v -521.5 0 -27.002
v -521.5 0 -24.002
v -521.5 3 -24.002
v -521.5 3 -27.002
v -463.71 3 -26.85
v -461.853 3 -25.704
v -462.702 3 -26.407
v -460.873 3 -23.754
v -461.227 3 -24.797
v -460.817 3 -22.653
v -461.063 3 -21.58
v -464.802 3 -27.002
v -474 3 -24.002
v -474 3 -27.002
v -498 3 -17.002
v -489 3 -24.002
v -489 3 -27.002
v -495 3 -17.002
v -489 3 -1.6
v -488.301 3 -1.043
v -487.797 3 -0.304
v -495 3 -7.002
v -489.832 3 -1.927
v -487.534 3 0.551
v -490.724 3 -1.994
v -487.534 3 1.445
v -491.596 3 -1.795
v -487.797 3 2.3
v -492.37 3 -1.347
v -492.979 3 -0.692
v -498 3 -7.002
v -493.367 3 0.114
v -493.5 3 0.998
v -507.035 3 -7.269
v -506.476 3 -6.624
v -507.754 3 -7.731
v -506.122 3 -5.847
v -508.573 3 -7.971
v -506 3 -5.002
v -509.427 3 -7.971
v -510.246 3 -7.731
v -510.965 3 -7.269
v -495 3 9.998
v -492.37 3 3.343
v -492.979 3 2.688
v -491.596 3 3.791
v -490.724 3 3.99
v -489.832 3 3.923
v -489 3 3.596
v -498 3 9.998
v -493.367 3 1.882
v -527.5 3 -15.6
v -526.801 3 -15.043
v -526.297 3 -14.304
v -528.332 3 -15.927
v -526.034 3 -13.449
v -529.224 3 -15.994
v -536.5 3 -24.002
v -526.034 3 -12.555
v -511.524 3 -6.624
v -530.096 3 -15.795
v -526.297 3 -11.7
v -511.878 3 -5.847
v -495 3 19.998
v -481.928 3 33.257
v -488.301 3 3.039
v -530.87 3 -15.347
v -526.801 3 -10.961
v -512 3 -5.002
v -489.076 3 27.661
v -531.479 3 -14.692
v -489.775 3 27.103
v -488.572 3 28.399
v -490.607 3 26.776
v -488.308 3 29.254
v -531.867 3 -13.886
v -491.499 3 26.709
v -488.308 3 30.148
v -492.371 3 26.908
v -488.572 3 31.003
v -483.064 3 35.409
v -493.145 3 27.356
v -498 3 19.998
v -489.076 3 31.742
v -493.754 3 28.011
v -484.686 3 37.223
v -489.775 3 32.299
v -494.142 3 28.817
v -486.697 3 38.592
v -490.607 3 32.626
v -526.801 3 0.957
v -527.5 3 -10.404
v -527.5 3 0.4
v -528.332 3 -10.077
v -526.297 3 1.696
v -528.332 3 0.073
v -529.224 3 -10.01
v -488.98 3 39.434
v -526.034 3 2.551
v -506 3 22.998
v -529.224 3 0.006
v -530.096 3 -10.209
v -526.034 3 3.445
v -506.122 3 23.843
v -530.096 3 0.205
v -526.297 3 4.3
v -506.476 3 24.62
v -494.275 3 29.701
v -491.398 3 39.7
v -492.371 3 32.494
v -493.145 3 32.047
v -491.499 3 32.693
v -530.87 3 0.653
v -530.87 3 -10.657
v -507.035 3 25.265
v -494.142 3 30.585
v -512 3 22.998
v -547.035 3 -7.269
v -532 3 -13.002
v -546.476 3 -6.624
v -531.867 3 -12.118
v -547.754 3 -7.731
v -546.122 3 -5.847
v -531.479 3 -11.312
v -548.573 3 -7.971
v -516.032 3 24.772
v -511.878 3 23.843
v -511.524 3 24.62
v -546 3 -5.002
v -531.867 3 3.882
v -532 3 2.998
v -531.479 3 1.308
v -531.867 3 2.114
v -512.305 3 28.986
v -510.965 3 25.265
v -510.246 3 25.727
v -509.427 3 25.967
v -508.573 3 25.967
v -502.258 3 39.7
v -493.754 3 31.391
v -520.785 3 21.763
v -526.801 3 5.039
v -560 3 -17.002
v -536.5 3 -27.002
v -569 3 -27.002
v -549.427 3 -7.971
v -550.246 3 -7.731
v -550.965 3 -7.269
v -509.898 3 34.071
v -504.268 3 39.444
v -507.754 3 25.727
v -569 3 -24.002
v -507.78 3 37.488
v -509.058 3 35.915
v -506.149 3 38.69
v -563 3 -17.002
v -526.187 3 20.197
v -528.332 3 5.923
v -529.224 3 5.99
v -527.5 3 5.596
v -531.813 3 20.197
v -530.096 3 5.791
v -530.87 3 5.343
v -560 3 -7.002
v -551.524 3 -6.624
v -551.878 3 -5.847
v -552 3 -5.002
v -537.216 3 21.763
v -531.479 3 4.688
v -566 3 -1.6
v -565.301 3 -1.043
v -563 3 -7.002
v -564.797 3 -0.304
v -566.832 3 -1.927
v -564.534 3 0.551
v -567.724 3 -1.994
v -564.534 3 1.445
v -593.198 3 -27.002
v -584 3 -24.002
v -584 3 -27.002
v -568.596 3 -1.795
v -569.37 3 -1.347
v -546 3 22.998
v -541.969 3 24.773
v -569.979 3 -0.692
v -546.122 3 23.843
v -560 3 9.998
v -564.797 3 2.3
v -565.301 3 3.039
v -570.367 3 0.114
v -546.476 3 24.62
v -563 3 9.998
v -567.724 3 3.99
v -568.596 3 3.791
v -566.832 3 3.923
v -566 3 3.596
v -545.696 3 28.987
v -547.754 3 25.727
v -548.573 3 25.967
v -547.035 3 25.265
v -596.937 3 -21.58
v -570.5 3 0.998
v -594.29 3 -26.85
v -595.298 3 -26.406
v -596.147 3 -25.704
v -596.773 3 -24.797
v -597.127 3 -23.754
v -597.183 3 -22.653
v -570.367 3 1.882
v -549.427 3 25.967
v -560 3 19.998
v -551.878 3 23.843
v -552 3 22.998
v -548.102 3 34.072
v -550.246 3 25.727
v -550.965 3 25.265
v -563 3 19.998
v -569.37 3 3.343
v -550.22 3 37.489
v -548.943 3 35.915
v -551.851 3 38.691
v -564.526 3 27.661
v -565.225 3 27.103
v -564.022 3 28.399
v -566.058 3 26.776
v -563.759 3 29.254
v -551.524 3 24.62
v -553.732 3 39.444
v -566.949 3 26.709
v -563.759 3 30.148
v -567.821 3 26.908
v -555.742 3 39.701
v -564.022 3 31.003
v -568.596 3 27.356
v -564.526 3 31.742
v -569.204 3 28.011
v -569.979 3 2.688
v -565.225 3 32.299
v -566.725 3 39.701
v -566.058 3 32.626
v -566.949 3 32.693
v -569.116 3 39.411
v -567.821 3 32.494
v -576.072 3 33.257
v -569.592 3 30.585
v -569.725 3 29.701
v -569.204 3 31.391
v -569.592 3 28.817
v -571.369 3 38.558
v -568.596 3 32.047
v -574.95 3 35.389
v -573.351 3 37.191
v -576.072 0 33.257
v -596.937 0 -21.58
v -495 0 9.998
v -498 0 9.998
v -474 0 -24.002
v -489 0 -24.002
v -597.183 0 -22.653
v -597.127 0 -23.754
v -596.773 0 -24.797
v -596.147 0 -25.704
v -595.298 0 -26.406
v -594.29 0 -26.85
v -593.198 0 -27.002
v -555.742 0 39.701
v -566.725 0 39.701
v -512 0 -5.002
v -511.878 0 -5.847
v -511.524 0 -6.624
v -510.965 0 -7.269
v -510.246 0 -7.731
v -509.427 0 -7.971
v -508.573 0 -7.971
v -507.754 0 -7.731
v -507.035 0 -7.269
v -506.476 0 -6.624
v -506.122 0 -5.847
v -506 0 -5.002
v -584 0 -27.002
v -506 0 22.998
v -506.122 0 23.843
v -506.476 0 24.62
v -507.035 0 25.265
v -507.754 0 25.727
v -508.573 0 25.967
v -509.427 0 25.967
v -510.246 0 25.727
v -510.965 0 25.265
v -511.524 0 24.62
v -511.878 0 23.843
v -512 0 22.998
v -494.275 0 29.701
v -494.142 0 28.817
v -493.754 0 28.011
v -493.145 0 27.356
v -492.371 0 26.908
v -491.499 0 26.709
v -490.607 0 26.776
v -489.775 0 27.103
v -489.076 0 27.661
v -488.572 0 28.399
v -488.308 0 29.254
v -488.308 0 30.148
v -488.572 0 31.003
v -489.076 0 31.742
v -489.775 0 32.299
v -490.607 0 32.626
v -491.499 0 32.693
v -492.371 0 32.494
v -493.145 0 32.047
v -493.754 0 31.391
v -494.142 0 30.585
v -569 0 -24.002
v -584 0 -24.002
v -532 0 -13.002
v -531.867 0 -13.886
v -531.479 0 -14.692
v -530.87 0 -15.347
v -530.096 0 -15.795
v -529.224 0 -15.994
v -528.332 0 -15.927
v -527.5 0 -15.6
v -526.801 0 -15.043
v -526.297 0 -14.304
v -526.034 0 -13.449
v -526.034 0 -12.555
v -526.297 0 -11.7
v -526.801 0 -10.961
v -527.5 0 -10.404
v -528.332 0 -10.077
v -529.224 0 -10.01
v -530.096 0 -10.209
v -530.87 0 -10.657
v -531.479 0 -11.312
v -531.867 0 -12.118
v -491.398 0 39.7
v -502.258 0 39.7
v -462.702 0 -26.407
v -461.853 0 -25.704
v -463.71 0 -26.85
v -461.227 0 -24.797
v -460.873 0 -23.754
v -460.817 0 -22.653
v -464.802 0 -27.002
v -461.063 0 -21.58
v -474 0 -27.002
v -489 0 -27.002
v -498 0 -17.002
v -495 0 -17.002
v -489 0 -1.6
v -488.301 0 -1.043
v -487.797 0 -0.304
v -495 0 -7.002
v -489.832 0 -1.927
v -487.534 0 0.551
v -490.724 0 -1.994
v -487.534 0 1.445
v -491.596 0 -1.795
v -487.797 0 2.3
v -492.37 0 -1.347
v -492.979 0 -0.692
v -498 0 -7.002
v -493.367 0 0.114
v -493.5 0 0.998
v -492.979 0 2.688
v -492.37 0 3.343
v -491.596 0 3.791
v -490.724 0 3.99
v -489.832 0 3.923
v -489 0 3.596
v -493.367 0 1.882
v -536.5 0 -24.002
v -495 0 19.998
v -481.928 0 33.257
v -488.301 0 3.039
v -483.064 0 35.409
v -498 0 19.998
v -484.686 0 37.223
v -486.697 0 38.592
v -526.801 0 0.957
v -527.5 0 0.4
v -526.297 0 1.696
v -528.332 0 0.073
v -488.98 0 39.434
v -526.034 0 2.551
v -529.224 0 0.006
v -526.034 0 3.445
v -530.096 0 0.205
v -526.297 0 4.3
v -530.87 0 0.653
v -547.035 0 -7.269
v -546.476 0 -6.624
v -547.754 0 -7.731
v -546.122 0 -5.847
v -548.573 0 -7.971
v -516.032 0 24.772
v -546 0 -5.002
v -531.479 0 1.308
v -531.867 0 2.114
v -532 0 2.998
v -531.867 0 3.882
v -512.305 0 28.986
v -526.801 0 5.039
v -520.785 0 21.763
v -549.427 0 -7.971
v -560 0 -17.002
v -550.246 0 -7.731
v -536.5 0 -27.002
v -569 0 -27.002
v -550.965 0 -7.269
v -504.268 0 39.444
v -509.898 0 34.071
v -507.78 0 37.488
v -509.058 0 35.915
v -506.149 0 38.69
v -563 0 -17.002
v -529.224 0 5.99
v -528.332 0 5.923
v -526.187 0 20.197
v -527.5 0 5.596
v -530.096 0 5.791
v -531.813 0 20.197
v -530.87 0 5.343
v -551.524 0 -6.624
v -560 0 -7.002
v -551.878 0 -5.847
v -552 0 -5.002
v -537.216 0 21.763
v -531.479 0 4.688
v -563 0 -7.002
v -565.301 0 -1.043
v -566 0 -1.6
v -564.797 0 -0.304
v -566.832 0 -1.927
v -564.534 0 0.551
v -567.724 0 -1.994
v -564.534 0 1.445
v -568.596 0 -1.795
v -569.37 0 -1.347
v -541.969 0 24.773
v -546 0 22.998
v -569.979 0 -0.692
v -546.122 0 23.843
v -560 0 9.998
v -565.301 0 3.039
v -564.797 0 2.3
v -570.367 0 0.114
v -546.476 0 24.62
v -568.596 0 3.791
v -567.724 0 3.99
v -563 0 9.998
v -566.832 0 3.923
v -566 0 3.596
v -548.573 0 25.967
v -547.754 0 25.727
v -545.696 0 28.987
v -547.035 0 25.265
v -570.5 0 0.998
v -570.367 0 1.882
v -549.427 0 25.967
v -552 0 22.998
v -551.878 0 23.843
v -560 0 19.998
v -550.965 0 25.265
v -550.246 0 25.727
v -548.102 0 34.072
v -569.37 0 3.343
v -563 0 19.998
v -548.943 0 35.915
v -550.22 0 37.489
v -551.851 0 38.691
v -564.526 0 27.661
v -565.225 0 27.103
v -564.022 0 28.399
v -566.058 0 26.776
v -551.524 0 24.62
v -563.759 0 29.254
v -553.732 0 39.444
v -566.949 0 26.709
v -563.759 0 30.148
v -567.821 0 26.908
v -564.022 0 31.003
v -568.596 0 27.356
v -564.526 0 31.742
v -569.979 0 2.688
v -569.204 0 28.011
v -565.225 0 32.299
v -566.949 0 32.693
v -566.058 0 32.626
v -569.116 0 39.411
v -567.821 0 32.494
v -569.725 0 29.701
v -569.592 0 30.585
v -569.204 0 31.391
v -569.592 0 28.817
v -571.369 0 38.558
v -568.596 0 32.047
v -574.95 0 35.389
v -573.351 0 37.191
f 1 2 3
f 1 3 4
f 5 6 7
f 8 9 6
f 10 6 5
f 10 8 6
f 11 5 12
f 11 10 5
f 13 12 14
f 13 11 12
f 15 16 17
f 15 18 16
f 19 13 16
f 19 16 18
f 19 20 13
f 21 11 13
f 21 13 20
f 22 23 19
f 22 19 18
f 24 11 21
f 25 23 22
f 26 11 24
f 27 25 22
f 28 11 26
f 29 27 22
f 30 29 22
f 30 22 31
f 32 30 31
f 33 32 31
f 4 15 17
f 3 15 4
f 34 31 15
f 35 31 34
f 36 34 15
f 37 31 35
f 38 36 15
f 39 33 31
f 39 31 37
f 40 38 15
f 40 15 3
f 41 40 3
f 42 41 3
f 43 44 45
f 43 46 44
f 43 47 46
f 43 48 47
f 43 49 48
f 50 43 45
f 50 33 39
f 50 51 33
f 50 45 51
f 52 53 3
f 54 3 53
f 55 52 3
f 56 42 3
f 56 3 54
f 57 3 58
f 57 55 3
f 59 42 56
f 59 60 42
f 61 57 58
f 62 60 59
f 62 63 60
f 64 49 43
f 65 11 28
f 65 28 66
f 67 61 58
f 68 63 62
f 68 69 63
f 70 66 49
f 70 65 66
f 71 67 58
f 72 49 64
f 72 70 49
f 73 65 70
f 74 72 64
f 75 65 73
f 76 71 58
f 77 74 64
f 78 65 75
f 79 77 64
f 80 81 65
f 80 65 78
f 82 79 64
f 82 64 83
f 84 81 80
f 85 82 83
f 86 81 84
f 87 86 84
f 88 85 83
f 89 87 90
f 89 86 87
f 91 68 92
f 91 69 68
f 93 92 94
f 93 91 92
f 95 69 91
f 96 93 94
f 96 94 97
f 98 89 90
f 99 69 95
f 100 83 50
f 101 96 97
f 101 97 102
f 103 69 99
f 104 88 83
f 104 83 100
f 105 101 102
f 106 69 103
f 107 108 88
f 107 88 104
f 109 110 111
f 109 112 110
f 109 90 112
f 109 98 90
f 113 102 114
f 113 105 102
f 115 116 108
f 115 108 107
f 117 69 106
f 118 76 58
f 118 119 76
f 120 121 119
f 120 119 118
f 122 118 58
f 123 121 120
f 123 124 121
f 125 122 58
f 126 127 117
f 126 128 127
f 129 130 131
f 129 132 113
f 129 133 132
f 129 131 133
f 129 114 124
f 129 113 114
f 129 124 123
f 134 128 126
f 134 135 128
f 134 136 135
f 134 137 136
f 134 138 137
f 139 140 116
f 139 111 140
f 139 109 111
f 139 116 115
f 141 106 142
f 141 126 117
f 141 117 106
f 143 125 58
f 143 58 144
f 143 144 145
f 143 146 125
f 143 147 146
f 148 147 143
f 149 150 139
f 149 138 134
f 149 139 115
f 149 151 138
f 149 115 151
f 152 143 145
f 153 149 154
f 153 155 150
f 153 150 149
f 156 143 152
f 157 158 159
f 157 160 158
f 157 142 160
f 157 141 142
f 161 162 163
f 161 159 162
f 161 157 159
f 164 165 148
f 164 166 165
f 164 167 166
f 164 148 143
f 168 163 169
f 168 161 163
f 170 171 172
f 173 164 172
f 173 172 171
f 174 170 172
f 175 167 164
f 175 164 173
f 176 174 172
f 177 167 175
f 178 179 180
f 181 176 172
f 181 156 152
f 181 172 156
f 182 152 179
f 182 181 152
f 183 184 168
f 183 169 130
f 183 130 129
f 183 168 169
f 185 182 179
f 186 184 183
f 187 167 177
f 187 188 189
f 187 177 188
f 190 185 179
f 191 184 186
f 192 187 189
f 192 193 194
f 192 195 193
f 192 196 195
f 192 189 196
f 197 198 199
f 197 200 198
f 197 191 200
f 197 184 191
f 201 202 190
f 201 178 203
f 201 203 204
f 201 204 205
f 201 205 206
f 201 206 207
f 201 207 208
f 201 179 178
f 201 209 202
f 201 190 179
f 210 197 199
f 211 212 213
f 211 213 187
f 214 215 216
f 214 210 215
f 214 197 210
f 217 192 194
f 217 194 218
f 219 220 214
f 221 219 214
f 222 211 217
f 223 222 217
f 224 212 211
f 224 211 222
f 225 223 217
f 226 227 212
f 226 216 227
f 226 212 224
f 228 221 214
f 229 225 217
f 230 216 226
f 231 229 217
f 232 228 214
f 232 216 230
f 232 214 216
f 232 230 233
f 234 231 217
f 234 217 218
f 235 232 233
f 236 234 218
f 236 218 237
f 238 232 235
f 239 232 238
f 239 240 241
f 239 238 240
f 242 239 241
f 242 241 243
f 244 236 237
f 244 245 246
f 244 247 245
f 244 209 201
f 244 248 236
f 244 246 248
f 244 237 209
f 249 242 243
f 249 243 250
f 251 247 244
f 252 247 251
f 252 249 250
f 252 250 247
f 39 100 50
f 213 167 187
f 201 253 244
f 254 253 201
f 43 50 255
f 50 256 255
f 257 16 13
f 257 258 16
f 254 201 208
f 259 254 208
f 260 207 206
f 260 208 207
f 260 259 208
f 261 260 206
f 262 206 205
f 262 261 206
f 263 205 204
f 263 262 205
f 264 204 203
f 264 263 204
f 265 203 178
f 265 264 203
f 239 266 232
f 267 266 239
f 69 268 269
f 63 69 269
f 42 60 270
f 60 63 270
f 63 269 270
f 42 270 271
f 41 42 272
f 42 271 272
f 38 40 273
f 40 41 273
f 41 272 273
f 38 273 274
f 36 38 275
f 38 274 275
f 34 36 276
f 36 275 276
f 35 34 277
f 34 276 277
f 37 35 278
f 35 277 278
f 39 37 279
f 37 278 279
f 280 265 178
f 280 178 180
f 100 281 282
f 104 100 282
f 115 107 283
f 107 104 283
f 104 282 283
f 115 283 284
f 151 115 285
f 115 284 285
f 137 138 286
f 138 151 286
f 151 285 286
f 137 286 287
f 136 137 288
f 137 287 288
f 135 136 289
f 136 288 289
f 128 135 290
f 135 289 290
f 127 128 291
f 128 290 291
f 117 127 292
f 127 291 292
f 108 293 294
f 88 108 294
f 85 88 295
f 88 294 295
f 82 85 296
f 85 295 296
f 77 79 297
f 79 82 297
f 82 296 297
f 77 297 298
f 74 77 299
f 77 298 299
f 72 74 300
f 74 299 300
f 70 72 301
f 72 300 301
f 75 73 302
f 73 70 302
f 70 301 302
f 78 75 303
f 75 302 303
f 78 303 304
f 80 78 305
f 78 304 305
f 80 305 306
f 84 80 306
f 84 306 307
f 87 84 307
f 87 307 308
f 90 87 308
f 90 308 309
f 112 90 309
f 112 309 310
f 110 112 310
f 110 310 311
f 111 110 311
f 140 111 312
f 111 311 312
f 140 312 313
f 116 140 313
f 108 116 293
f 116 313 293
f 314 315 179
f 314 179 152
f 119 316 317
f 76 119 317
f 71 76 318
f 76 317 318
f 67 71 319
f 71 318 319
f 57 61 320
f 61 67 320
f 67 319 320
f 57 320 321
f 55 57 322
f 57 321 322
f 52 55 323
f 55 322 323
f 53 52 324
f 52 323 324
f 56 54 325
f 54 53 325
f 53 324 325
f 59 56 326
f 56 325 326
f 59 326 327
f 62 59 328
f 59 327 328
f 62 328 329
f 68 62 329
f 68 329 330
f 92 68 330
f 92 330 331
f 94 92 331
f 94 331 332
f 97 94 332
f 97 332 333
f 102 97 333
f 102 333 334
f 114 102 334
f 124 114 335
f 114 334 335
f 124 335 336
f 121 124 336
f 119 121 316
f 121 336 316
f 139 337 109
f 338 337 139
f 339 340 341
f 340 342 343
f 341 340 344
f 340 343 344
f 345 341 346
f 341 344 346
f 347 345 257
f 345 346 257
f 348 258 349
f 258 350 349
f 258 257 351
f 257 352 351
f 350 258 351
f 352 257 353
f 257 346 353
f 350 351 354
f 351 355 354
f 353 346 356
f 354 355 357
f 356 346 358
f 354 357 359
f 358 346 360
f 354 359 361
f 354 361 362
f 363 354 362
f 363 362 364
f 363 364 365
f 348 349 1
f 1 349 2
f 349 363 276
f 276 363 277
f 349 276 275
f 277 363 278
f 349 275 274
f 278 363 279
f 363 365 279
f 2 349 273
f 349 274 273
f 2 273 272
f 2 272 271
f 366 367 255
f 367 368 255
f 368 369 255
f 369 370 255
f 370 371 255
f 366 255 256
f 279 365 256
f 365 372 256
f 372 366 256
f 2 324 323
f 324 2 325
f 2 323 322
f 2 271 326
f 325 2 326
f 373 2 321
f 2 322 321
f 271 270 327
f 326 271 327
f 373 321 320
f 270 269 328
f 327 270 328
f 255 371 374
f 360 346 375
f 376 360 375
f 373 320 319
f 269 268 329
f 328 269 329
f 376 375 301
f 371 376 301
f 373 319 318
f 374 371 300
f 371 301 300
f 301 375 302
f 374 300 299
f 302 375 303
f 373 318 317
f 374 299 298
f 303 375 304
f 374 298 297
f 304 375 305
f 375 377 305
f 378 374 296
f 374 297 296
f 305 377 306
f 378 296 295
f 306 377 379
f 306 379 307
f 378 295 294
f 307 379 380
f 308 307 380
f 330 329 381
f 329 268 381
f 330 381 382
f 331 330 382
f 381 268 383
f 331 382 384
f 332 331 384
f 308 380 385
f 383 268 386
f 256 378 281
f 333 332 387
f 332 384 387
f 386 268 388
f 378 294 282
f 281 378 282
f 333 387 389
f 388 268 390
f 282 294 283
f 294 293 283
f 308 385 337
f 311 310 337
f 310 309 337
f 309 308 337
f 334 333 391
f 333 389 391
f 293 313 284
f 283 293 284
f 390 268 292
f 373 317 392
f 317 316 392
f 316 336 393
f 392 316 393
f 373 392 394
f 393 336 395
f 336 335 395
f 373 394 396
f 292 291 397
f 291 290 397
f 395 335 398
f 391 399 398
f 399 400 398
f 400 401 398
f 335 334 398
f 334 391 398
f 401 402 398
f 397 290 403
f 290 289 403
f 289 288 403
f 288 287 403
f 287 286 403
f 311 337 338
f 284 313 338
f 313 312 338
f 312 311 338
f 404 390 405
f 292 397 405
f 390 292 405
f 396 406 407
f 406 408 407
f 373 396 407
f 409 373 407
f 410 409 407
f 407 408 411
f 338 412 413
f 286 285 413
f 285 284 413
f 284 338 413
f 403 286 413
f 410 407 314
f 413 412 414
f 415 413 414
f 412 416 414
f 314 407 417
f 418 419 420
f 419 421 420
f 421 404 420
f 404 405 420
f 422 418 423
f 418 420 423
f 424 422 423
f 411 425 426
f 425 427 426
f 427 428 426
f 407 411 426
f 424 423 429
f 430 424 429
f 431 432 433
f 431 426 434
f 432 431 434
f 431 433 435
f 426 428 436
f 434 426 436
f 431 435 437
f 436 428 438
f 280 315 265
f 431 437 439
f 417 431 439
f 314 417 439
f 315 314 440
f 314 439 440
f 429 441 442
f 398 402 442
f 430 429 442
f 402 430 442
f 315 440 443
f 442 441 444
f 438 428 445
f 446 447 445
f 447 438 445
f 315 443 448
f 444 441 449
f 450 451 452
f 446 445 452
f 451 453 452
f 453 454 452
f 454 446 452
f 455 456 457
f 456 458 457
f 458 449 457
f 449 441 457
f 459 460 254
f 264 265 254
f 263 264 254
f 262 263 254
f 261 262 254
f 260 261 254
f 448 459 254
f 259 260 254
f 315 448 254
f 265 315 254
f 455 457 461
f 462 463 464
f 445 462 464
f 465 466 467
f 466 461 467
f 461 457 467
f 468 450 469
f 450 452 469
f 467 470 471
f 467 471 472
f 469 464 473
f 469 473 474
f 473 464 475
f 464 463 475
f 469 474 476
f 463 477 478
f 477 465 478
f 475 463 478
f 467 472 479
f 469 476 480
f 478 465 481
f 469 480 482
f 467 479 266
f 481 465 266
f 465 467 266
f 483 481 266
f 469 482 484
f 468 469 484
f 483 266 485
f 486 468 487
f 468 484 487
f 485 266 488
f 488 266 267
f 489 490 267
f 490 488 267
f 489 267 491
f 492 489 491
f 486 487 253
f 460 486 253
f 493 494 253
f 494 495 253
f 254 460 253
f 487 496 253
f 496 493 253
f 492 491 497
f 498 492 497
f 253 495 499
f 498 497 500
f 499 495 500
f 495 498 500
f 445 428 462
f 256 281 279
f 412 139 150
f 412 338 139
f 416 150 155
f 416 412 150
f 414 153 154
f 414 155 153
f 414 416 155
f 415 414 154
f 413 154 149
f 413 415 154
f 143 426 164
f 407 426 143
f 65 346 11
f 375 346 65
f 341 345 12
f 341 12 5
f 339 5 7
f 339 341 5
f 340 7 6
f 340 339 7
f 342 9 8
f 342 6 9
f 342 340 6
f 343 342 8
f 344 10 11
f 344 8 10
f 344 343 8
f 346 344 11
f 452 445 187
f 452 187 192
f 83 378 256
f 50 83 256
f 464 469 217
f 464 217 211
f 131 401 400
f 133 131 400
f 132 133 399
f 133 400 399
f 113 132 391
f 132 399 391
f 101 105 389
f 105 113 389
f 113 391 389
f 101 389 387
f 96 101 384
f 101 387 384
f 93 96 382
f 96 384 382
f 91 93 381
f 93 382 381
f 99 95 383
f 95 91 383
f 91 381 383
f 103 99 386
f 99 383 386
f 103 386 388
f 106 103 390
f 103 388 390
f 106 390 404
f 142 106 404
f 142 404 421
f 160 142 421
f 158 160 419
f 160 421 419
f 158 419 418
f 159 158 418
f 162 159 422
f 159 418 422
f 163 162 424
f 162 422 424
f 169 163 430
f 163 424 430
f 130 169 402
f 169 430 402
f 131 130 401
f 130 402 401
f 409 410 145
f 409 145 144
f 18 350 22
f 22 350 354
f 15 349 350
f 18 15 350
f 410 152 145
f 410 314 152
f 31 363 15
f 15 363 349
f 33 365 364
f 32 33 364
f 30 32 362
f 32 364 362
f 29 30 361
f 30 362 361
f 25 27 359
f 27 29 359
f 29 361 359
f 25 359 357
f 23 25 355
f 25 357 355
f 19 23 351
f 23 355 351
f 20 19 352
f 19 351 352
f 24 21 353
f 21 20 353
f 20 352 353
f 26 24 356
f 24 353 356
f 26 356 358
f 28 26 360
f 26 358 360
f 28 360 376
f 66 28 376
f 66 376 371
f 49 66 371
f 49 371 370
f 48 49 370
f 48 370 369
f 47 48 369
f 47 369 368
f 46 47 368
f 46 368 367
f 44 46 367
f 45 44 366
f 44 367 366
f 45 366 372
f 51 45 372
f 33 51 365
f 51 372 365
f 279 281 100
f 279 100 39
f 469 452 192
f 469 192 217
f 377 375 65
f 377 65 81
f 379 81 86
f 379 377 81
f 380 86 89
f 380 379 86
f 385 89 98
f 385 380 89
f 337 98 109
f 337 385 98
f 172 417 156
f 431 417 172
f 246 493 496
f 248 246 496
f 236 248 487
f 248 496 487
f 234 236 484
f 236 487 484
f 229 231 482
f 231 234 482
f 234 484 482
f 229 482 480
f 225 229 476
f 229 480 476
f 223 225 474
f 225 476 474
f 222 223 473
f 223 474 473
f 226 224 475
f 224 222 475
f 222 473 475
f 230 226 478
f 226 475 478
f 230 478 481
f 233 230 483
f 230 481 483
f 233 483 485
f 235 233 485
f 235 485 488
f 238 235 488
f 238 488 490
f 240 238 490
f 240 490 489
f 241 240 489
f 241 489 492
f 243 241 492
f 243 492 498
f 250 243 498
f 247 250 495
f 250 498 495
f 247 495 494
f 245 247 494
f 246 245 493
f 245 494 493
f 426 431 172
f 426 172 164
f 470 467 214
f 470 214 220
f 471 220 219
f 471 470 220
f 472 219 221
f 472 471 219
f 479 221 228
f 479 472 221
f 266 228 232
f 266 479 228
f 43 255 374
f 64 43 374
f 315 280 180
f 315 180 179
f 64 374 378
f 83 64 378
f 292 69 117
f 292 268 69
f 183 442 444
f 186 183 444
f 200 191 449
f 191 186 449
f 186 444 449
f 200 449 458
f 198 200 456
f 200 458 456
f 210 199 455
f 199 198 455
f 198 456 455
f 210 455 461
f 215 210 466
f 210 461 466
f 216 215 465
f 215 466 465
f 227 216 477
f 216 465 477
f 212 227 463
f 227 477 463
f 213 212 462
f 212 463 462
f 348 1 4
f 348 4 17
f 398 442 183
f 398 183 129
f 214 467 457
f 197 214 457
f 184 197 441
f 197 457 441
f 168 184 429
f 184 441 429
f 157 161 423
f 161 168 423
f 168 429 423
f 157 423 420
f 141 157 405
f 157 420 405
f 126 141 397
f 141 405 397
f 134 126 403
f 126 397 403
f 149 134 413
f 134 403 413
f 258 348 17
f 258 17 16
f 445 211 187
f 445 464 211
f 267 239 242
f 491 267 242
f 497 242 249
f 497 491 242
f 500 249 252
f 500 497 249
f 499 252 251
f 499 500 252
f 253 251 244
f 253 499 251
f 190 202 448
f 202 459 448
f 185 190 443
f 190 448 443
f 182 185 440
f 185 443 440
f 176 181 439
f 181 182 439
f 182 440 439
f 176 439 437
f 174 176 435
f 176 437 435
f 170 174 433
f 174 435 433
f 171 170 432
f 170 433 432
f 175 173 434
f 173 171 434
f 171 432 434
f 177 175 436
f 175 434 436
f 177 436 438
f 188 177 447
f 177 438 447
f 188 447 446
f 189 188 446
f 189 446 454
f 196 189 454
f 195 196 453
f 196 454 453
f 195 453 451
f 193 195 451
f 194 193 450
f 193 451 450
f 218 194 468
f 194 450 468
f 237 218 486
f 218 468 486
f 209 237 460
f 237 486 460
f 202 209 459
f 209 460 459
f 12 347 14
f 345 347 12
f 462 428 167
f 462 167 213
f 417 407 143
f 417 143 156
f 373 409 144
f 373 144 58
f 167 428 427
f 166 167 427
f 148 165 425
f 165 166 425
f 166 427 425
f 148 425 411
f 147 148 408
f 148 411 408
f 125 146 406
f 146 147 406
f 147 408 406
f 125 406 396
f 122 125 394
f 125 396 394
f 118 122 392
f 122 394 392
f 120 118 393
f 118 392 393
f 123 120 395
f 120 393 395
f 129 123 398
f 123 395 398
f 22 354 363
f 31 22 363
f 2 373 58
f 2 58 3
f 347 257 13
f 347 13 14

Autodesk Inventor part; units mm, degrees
ref_plane "YZ Plane" through (0, 0, 0) normal (1, 0, 0) x (0, 1, 0)
ref_plane "XZ Plane" through (0, 0, 0) normal (0, 1, 0) x (-1, 0, 0)
ref_plane "XY Plane" through (0, 0, 0) normal (0, 0, 1) x (1, 0, 0)
sketch "Sketch2" plane through (0, 0, 0) normal (0, 1, 0) x (-1, 0, 0)
  line L0 (600, 68.7059) -> (634, 68.7059)
  arc A0 (642, 60.7059) -> (634, 68.7059) centre (634, 60.7059) ccw
  line L1 (642, 60.7059) -> (642, 56.7059)
  arc A1 (634, 48.7059) -> (642, 56.7059) centre (634, 56.7059) ccw
  line L2 (634, 48.7059) -> (632, 48.7059)
  arc A2 (632, 48.7059) -> (624, 40.7059) centre (632, 40.7059) ccw
  line L3 (624, 40.7059) -> (624, 36.7059)
  arc A3 (624, 36.7059) -> (632, 28.7059) centre (632, 36.7059) ccw
  line L4 (632, 28.7059) -> (634, 28.7059)
  arc A4 (642, 20.7059) -> (634, 28.7059) centre (634, 20.7059) ccw
  line L5 (642, 20.7059) -> (642, 16.7059)
  arc A5 (634, 8.7059) -> (642, 16.7059) centre (634, 16.7059) ccw
  line L6 (634, 8.7059) -> (600, 8.7059)
  arc A6 (592, 16.7059) -> (600, 8.7059) centre (600, 16.7059) ccw
  line L7 (592, 16.7059) -> (592, 21.7059)
  line L8 (592, 21.7059) -> (606.1716, 35.8774)
  arc A7 (606.1716, 35.8774) -> (606.1716, 41.5343) centre (603.3431, 38.7059) ccw
  line L9 (606.1716, -97.5343) -> (592, -111.7059)
  line L10 (592, -111.7059) -> (592, -116.7059)
  arc A8 (592, -116.7059) -> (600, -124.7059) centre (600, -116.7059) ccw
  line L11 (600, -124.7059) -> (634, -124.7059)
  arc A9 (634, -124.7059) -> (642, -116.7059) centre (634, -116.7059) ccw
  line L12 (642, -116.7059) -> (642, -112.7059)
  arc A10 (642, -112.7059) -> (634, -104.7059) centre (634, -112.7059) ccw
  line L13 (634, -104.7059) -> (632, -104.7059)
  arc A11 (624, -96.7059) -> (632, -104.7059) centre (632, -96.7059) ccw
  line L14 (624, -96.7059) -> (624, -92.7059)
  arc A12 (632, -84.7059) -> (624, -92.7059) centre (632, -92.7059) ccw
  line L15 (632, -84.7059) -> (634, -84.7059)
  arc A13 (634, -84.7059) -> (642, -76.7059) centre (634, -76.7059) ccw
  line L16 (642, -76.7059) -> (642, -72.7059)
  arc A14 (642, -72.7059) -> (634, -64.7059) centre (634, -72.7059) ccw
  line L17 (634, -64.7059) -> (600, -64.7059)
  arc A15 (600, -64.7059) -> (592, -72.7059) centre (600, -72.7059) ccw
  line L18 (592, -72.7059) -> (592, -77.7059)
  line L19 (592, -77.7059) -> (606.1716, -91.8774)
  arc A16 (606.1716, -97.5343) -> (606.1716, -91.8774) centre (603.3431, -94.7059) ccw
  circle A17 centre (618, -74.7059) radius 3
  circle A18 centre (634, -74.7059) radius 3
  circle A19 centre (634, -114.7059) radius 3
  circle A20 centre (618, -114.7059) radius 3
  circle A21 centre (618, 58.7059) radius 3
  circle A22 centre (634, 58.7059) radius 3
  circle A23 centre (634, 18.7059) radius 3
  circle A24 centre (618, 18.7059) radius 3
  line L20 (606.1716, 41.5343) -> (592, 55.7059)
  line L21 (592, 55.7059) -> (592, 60.7059)
  arc A25 (600, 68.7059) -> (592, 60.7059) centre (600, 60.7059) ccw
  line L22 (329, -137) -> (729, -137)
  line L23 (729, -137) -> (729, 83)
  line L24 (729, 83) -> (329, 83)
  line L25 (329, 83) -> (329, -137)
  line L26 (444, -107.4043) -> (417.5, -107.4043)
  line L27 (417.5, -107.4043) -> (417.5, -104.4043)
  line L28 (417.5, -104.4043) -> (450, -104.4043)
  line L29 (450, -104.4043) -> (450, -107.4043)
  line L30 (450, -107.4043) -> (444, -107.4043)
  line L31 (441, -117.9043) -> (444, -117.9043)
  line L32 (444, -117.9043) -> (444, -110.9043)
  line L33 (444, -110.9043) -> (441, -110.9043)
  line L34 (441, -110.9043) -> (441, -117.9043)
  line L35 (417.5, -121.4043) -> (417.5, -124.4043)
  line L36 (417.5, -124.4043) -> (450, -124.4043)
  line L37 (450, -124.4043) -> (450, -121.4043)
  line L38 (450, -121.4043) -> (417.5, -121.4043)
  line L39 (376.0002, -107.4043) -> (402.5, -107.4043)
  line L40 (402.5, -107.4043) -> (402.5, -104.4043)
  line L41 (402.5, -104.4043) -> (370, -104.4043)
  line L42 (370, -104.4043) -> (370, -107.4043)
  line L43 (370, -107.4043) -> (376.0002, -107.4043)
  line L44 (379.0002, -121.4043) -> (370, -121.4043)
  line L45 (370, -121.4043) -> (370, -124.4043)
  line L46 (370, -124.4043) -> (402.5, -124.4043)
  line L47 (402.5, -124.4043) -> (402.5, -121.4043)
  line L48 (402.5, -121.4043) -> (379.0002, -121.4043)
  line L49 (379.0002, -117.9043) -> (376.0002, -117.9043)
  line L50 (376.0002, -117.9043) -> (376.0002, -110.9043)
  line L51 (376.0002, -110.9043) -> (379.0002, -110.9043)
  line L52 (379.0002, -110.9043) -> (379.0002, -117.9043)
  line L53 (348, -127) -> (472.0002, -127)
  line L54 (472.0002, -127) -> (472.0002, -124.4043)
  line L55 (472.0002, -124.4043) -> (465, -124.4043)
  line L56 (465, -124.4043) -> (465, -121.4043)
  line L57 (465, -121.4043) -> (472.0002, -121.4043)
  line L58 (472.0002, -121.4043) -> (472.0002, -107.4043)
  line L59 (472.0002, -107.4043) -> (465, -107.4043)
  line L60 (465, -107.4043) -> (465, -104.4043)
  line L61 (465, -104.4043) -> (472.0002, -104.4043)
  line L62 (472.0002, -104.4043) -> (472.0002, -101)
  line L63 (472.0002, -101) -> (348, -101)
  line L64 (348, -101) -> (348, -104.4043)
  line L65 (348, -104.4043) -> (355, -104.4043)
  line L66 (355, -104.4043) -> (355, -107.4043)
  line L67 (355, -107.4043) -> (348, -107.4043)
  line L68 (348, -107.4043) -> (348, -121.4043)
  line L69 (348, -121.4043) -> (355, -121.4043)
  line L70 (355, -121.4043) -> (355, -124.4043)
  line L71 (355, -124.4043) -> (348, -124.4043)
  line L72 (348, -124.4043) -> (348, -127)
  circle A26 centre (447.7252, -37.7011) radius 3
  circle A27 centre (372.2748, -37.7011) radius 3
  circle A28 centre (410, -64.4043) radius 3
  circle A29 centre (448.5, -66.4043) radius 3
  circle A30 centre (371.5, -66.4043) radius 3
  circle A31 centre (410, -80.4043) radius 3
  line L73 (379, -84.4043) -> (376, -84.4043)
  line L74 (376, -84.4043) -> (376, -74.4043)
  line L75 (376, -74.4043) -> (379, -74.4043)
  line L76 (379, -74.4043) -> (379, -84.4043)
  line L77 (379, -57.4043) -> (376, -57.4043)
  line L78 (376, -57.4043) -> (376, -47.4043)
  line L79 (376, -47.4043) -> (379, -47.4043)
  line L80 (379, -47.4043) -> (379, -57.4043)
  line L81 (441, -47.4043) -> (441, -57.4043)
  line L82 (441, -57.4043) -> (444, -57.4043)
  line L83 (444, -57.4043) -> (444, -47.4043)
  line L84 (444, -47.4043) -> (441, -47.4043)
  line L85 (441, -74.4043) -> (441, -84.4043)
  line L86 (441, -84.4043) -> (444, -84.4043)
  line L87 (444, -84.4043) -> (444, -74.4043)
  line L88 (444, -74.4043) -> (441, -74.4043)
  line L89 (427, -44.4043) -> (427, -72.4043)
  arc A32 (427, -72.4043) -> (433, -72.4043) centre (430, -72.4043) ccw
  line L90 (433, -72.4043) -> (433, -44.4043)
  arc A33 (433, -44.4043) -> (427, -44.4043) centre (430, -44.4043) ccw
  arc A34 (387, -72.4043) -> (393, -72.4043) centre (390, -72.4043) ccw
  line L91 (393, -72.4043) -> (393, -44.4043)
  arc A35 (393, -44.4043) -> (387, -44.4043) centre (390, -44.4043) ccw
  line L92 (387, -44.4043) -> (387, -72.4043)
  line L93 (372.3983, -27.7019) -> (383.2576, -27.7018)
  arc A36 (390.8984, -33.3311) -> (383.2576, -27.7018) centre (383.2577, -35.7018) ccw
  arc A37 (390.8984, -33.3311) -> (429.1018, -33.3307) centre (410, -27.4043) ccw
  arc A38 (436.7424, -27.7012) -> (429.1018, -33.3307) centre (436.7425, -35.7012) ccw
  line L94 (436.7424, -27.7012) -> (447.7251, -27.7011)
  arc A39 (457.0715, -34.1449) -> (447.7251, -27.7011) centre (447.7252, -37.7011) ccw
  line L95 (457.0715, -34.1449) -> (477.9368, -88.9818)
  arc A40 (474.1982, -94.4043) -> (477.9368, -88.9818) centre (474.1982, -90.4043) ccw
  line L96 (474.1982, -94.4043) -> (465, -94.4043)
  line L97 (465, -94.4043) -> (465, -91.4043)
  line L98 (465, -91.4043) -> (450, -91.4043)
  line L99 (450, -91.4043) -> (450, -94.4043)
  line L100 (450, -94.4043) -> (417.5, -94.4043)
  line L101 (417.5, -94.4043) -> (417.5, -91.4043)
  line L102 (417.5, -91.4043) -> (402.5, -91.4043)
  line L103 (402.5, -91.4043) -> (402.5, -94.4043)
  line L104 (402.5, -94.4043) -> (370, -94.4043)
  line L105 (370, -94.4043) -> (370, -91.4043)
  line L106 (370, -91.4043) -> (355, -91.4043)
  line L107 (355, -91.4043) -> (355, -94.4043)
  line L108 (355, -94.4043) -> (345.8018, -94.4043)
  arc A41 (342.0632, -88.9818) -> (345.8018, -94.4043) centre (345.8018, -90.4043) ccw
  line L109 (342.0632, -88.9818) -> (362.9285, -34.1449)
  arc A42 (372.3983, -27.7019) -> (362.9285, -34.1449) centre (372.2748, -37.7011) ccw
  line L110 (491.3983, -95.7004) -> (502.2576, -95.7005)
  arc A43 (502.2576, -95.7005) -> (509.8984, -90.0712) centre (502.2577, -87.7005) ccw
  arc A44 (548.1018, -90.0716) -> (509.8984, -90.0712) centre (529, -95.998) ccw
  arc A45 (548.1018, -90.0716) -> (555.7424, -95.701) centre (555.7425, -87.701) ccw
  line L111 (555.7424, -95.701) -> (566.7251, -95.7011)
  arc A46 (566.7251, -95.7011) -> (576.0715, -89.2574) centre (566.7252, -85.7011) ccw
  line L112 (576.0715, -89.2574) -> (596.9368, -34.4205)
  arc A47 (596.9368, -34.4205) -> (593.1982, -28.998) centre (593.1982, -32.998) ccw
  line L113 (593.1982, -28.998) -> (584, -28.998)
  line L114 (584, -28.998) -> (584, -31.998)
  line L115 (584, -31.998) -> (569, -31.998)
  line L116 (569, -31.998) -> (569, -28.998)
  line L117 (569, -28.998) -> (536.5, -28.998)
  line L118 (536.5, -28.998) -> (536.5, -31.998)
  line L119 (536.5, -31.998) -> (521.5, -31.998)
  line L120 (521.5, -31.998) -> (521.5, -28.998)
  line L121 (521.5, -28.998) -> (489, -28.998)
  line L122 (489, -28.998) -> (489, -31.998)
  line L123 (489, -31.998) -> (474, -31.998)
  line L124 (474, -31.998) -> (474, -28.998)
  line L125 (474, -28.998) -> (464.8018, -28.998)
  arc A48 (464.8018, -28.998) -> (461.0632, -34.4205) centre (464.8018, -32.998) ccw
  line L126 (461.0632, -34.4205) -> (481.9285, -89.2574)
  arc A49 (481.9285, -89.2574) -> (491.3983, -95.7004) centre (491.2748, -85.7011) ccw
  arc A50 (512, -50.998) -> (506, -50.998) centre (509, -50.998) ccw
  line L127 (512, -50.998) -> (512, -78.998)
  arc A51 (506, -78.998) -> (512, -78.998) centre (509, -78.998) ccw
  line L128 (506, -78.998) -> (506, -50.998)
  line L129 (546, -78.998) -> (546, -50.998)
  arc A52 (552, -50.998) -> (546, -50.998) centre (549, -50.998) ccw
  line L130 (552, -50.998) -> (552, -78.998)
  arc A53 (546, -78.998) -> (552, -78.998) centre (549, -78.998) ccw
  line L131 (560, -48.998) -> (560, -38.998)
  line L132 (560, -38.998) -> (563, -38.998)
  line L133 (563, -38.998) -> (563, -48.998)
  line L134 (563, -48.998) -> (560, -48.998)
  line L135 (560, -75.998) -> (560, -65.998)
  line L136 (560, -65.998) -> (563, -65.998)
  line L137 (563, -65.998) -> (563, -75.998)
  line L138 (563, -75.998) -> (560, -75.998)
  line L139 (498, -65.998) -> (495, -65.998)
  line L140 (495, -65.998) -> (495, -75.998)
  line L141 (495, -75.998) -> (498, -75.998)
  line L142 (498, -75.998) -> (498, -65.998)
  line L143 (498, -38.998) -> (495, -38.998)
  line L144 (495, -38.998) -> (495, -48.998)
  line L145 (495, -48.998) -> (498, -48.998)
  line L146 (498, -48.998) -> (498, -38.998)
  circle A54 centre (529, -42.998) radius 3
  circle A55 centre (490.5, -56.998) radius 3
  circle A56 centre (567.5, -56.998) radius 3
  circle A57 centre (529, -58.998) radius 3
  circle A58 centre (491.2748, -85.7011) radius 3
  circle A59 centre (566.7252, -85.7011) radius 3
  circle A60 centre (462, -114.4043) radius 3
  circle A61 centre (358.0002, -114.4043) radius 3
  line L147 (578, -104.4043) -> (578, -107.4043)
  line L148 (578, -107.4043) -> (585, -107.4043)
  line L149 (585, -107.4043) -> (585, -110.9043)
  line L150 (585, -110.9043) -> (588, -110.9043)
  line L151 (588, -110.9043) -> (588, -117.9043)
  line L152 (588, -117.9043) -> (585, -117.9043)
  line L153 (585, -117.9043) -> (585, -121.4043)
  line L154 (585, -121.4043) -> (578, -121.4043)
  line L155 (578, -121.4043) -> (578, -124.4043)
  line L156 (578, -124.4043) -> (568, -124.4043)
  line L157 (568, -124.4043) -> (568, -121.4043)
  line L158 (568, -121.4043) -> (551, -121.4043)
  line L159 (551, -121.4043) -> (551, -124.4043)
  line L160 (551, -124.4043) -> (541, -124.4043)
  line L161 (541, -124.4043) -> (541, -121.4043)
  line L162 (541, -121.4043) -> (535, -121.4043)
  line L163 (535, -121.4043) -> (535, -107.4043)
  line L164 (535, -107.4043) -> (541, -107.4043)
  line L165 (541, -107.4043) -> (541, -104.4043)
  line L166 (541, -104.4043) -> (551, -104.4043)
  line L167 (551, -104.4043) -> (551, -107.4043)
  line L168 (551, -107.4043) -> (568, -107.4043)
  line L169 (568, -107.4043) -> (568, -104.4043)
  line L170 (568, -104.4043) -> (578, -104.4043)
  line L171 (520, -104.4043) -> (520, -107.4043)
  line L172 (520, -107.4043) -> (527, -107.4043)
  line L173 (527, -107.4043) -> (527, -110.9043)
  line L174 (527, -110.9043) -> (530, -110.9043)
  line L175 (530, -110.9043) -> (530, -117.9043)
  line L176 (530, -117.9043) -> (527, -117.9043)
  line L177 (527, -117.9043) -> (527, -121.4043)
  line L178 (527, -121.4043) -> (520, -121.4043)
  line L179 (520, -121.4043) -> (520, -124.4043)
  line L180 (520, -124.4043) -> (510, -124.4043)
  line L181 (510, -124.4043) -> (510, -121.4043)
  line L182 (510, -121.4043) -> (493, -121.4043)
  line L183 (493, -121.4043) -> (493, -124.4043)
  line L184 (493, -124.4043) -> (483, -124.4043)
  line L185 (483, -124.4043) -> (483, -121.4043)
  line L186 (483, -121.4043) -> (477, -121.4043)
  line L187 (477, -121.4043) -> (477, -107.4043)
  line L188 (477, -107.4043) -> (483, -107.4043)
  line L189 (483, -107.4043) -> (483, -104.4043)
  line L190 (483, -104.4043) -> (493, -104.4043)
  line L191 (493, -104.4043) -> (493, -107.4043)
  line L192 (493, -107.4043) -> (510, -107.4043)
  line L193 (510, -107.4043) -> (510, -104.4043)
  line L194 (510, -104.4043) -> (520, -104.4043)
  line L195 (520, 48.4043) -> (520, 51.4043)
  line L196 (520, 51.4043) -> (527, 51.4043)
  line L197 (527, 51.4043) -> (527, 54.9043)
  line L198 (527, 54.9043) -> (530, 54.9043)
  line L199 (530, 54.9043) -> (530, 61.9043)
  line L200 (530, 61.9043) -> (527, 61.9043)
  line L201 (527, 61.9043) -> (527, 65.4043)
  line L202 (527, 65.4043) -> (520, 65.4043)
  line L203 (520, 65.4043) -> (520, 68.4043)
  line L204 (520, 68.4043) -> (510, 68.4043)
  line L205 (510, 68.4043) -> (510, 65.4043)
  line L206 (510, 65.4043) -> (493, 65.4043)
  line L207 (493, 65.4043) -> (493, 68.4043)
  line L208 (493, 68.4043) -> (483, 68.4043)
  line L209 (483, 68.4043) -> (483, 65.4043)
  line L210 (483, 65.4043) -> (477, 65.4043)
  line L211 (477, 65.4043) -> (477, 51.4043)
  line L212 (477, 51.4043) -> (483, 51.4043)
  line L213 (483, 51.4043) -> (483, 48.4043)
  line L214 (483, 48.4043) -> (493, 48.4043)
  line L215 (493, 48.4043) -> (493, 51.4043)
  line L216 (493, 51.4043) -> (510, 51.4043)
  line L217 (510, 51.4043) -> (510, 48.4043)
  line L218 (510, 48.4043) -> (520, 48.4043)
  line L219 (578, 48.4043) -> (578, 51.4043)
  line L220 (578, 51.4043) -> (585, 51.4043)
  line L221 (585, 51.4043) -> (585, 54.9043)
  line L222 (585, 54.9043) -> (588, 54.9043)
  line L223 (588, 54.9043) -> (588, 61.9043)
  line L224 (588, 61.9043) -> (585, 61.9043)
  line L225 (585, 61.9043) -> (585, 65.4043)
  line L226 (585, 65.4043) -> (578, 65.4043)
  line L227 (578, 65.4043) -> (578, 68.4043)
  line L228 (578, 68.4043) -> (568, 68.4043)
  line L229 (568, 68.4043) -> (568, 65.4043)
  line L230 (568, 65.4043) -> (551, 65.4043)
  line L231 (551, 65.4043) -> (551, 68.4043)
  line L232 (551, 68.4043) -> (541, 68.4043)
  line L233 (541, 68.4043) -> (541, 65.4043)
  line L234 (541, 65.4043) -> (535, 65.4043)
  line L235 (535, 65.4043) -> (535, 51.4043)
  line L236 (535, 51.4043) -> (541, 51.4043)
  line L237 (541, 51.4043) -> (541, 48.4043)
  line L238 (541, 48.4043) -> (551, 48.4043)
  line L239 (551, 48.4043) -> (551, 51.4043)
  line L240 (551, 51.4043) -> (568, 51.4043)
  line L241 (568, 51.4043) -> (568, 48.4043)
  line L242 (568, 48.4043) -> (578, 48.4043)
  circle A62 centre (358.0002, 58.4043) radius 3
  circle A63 centre (462, 58.4043) radius 3
  circle A64 centre (566.7252, 29.7011) radius 3
  circle A65 centre (491.2748, 29.7011) radius 3
  circle A66 centre (529, 2.998) radius 3
  circle A67 centre (567.5, 0.998) radius 3
  circle A68 centre (490.5, 0.998) radius 3
  circle A69 centre (529, -13.002) radius 3
  line L243 (498, -17.002) -> (495, -17.002)
  line L244 (495, -17.002) -> (495, -7.002)
  line L245 (495, -7.002) -> (498, -7.002)
  line L246 (498, -7.002) -> (498, -17.002)
  line L247 (498, 9.998) -> (495, 9.998)
  line L248 (495, 9.998) -> (495, 19.998)
  line L249 (495, 19.998) -> (498, 19.998)
  line L250 (498, 19.998) -> (498, 9.998)
  line L251 (560, 19.998) -> (560, 9.998)
  line L252 (560, 9.998) -> (563, 9.998)
  line L253 (563, 9.998) -> (563, 19.998)
  line L254 (563, 19.998) -> (560, 19.998)
  line L255 (560, -7.002) -> (560, -17.002)
  line L256 (560, -17.002) -> (563, -17.002)
  line L257 (563, -17.002) -> (563, -7.002)
  line L258 (563, -7.002) -> (560, -7.002)
  line L259 (546, 22.998) -> (546, -5.002)
  arc A70 (546, -5.002) -> (552, -5.002) centre (549, -5.002) ccw
  line L260 (552, -5.002) -> (552, 22.998)
  arc A71 (552, 22.998) -> (546, 22.998) centre (549, 22.998) ccw
  arc A72 (506, -5.002) -> (512, -5.002) centre (509, -5.002) ccw
  line L261 (512, -5.002) -> (512, 22.998)
  arc A73 (512, 22.998) -> (506, 22.998) centre (509, 22.998) ccw
  line L262 (506, 22.998) -> (506, -5.002)
  line L263 (491.3983, 39.7004) -> (502.2576, 39.7005)
  arc A74 (509.8984, 34.0712) -> (502.2576, 39.7005) centre (502.2577, 31.7005) ccw
  arc A75 (509.8984, 34.0712) -> (548.1018, 34.0716) centre (529, 39.998) ccw
  arc A76 (555.7424, 39.701) -> (548.1018, 34.0716) centre (555.7425, 31.701) ccw
  line L264 (555.7424, 39.701) -> (566.7251, 39.7011)
  arc A77 (576.0715, 33.2574) -> (566.7251, 39.7011) centre (566.7252, 29.7011) ccw
  line L265 (576.0715, 33.2574) -> (596.9368, -21.5795)
  arc A78 (593.1982, -27.002) -> (596.9368, -21.5795) centre (593.1982, -23.002) ccw
  line L266 (593.1982, -27.002) -> (584, -27.002)
  line L267 (584, -27.002) -> (584, -24.002)
  line L268 (584, -24.002) -> (569, -24.002)
  line L269 (569, -24.002) -> (569, -27.002)
  line L270 (569, -27.002) -> (536.5, -27.002)
  line L271 (536.5, -27.002) -> (536.5, -24.002)
  line L272 (536.5, -24.002) -> (521.5, -24.002)
  line L273 (521.5, -24.002) -> (521.5, -27.002)
  line L274 (521.5, -27.002) -> (489, -27.002)
  line L275 (489, -27.002) -> (489, -24.002)
  line L276 (489, -24.002) -> (474, -24.002)
  line L277 (474, -24.002) -> (474, -27.002)
  line L278 (474, -27.002) -> (464.8018, -27.002)
  arc A79 (461.0632, -21.5795) -> (464.8018, -27.002) centre (464.8018, -23.002) ccw
  line L279 (461.0632, -21.5795) -> (481.9285, 33.2574)
  arc A80 (491.3983, 39.7004) -> (481.9285, 33.2574) centre (491.2748, 29.7011) ccw
  line L280 (372.3983, -28.2981) -> (383.2576, -28.2982)
  arc A81 (383.2576, -28.2982) -> (390.8984, -22.6689) centre (383.2577, -20.2982) ccw
  arc A82 (429.1018, -22.6693) -> (390.8984, -22.6689) centre (410, -28.5957) ccw
  arc A83 (429.1018, -22.6693) -> (436.7424, -28.2988) centre (436.7425, -20.2988) ccw
  line L281 (436.7424, -28.2988) -> (447.7251, -28.2989)
  arc A84 (447.7251, -28.2989) -> (457.0715, -21.8551) centre (447.7252, -18.2989) ccw
  line L282 (457.0715, -21.8551) -> (477.9368, 32.9818)
  arc A85 (477.9368, 32.9818) -> (474.1982, 38.4043) centre (474.1982, 34.4043) ccw
  line L283 (474.1982, 38.4043) -> (465, 38.4043)
  line L284 (465, 38.4043) -> (465, 35.4043)
  line L285 (465, 35.4043) -> (450, 35.4043)
  line L286 (450, 35.4043) -> (450, 38.4043)
  line L287 (450, 38.4043) -> (417.5, 38.4043)
  line L288 (417.5, 38.4043) -> (417.5, 35.4043)
  line L289 (417.5, 35.4043) -> (402.5, 35.4043)
  line L290 (402.5, 35.4043) -> (402.5, 38.4043)
  line L291 (402.5, 38.4043) -> (370, 38.4043)
  line L292 (370, 38.4043) -> (370, 35.4043)
  line L293 (370, 35.4043) -> (355, 35.4043)
  line L294 (355, 35.4043) -> (355, 38.4043)
  line L295 (355, 38.4043) -> (345.8018, 38.4043)
  arc A86 (345.8018, 38.4043) -> (342.0632, 32.9818) centre (345.8018, 34.4043) ccw
  line L296 (342.0632, 32.9818) -> (362.9285, -21.8551)
  arc A87 (362.9285, -21.8551) -> (372.3983, -28.2981) centre (372.2748, -18.2989) ccw
  arc A88 (393, 16.4043) -> (387, 16.4043) centre (390, 16.4043) ccw
  line L297 (393, 16.4043) -> (393, -11.5957)
  arc A89 (387, -11.5957) -> (393, -11.5957) centre (390, -11.5957) ccw
  line L298 (387, -11.5957) -> (387, 16.4043)
  line L299 (427, -11.5957) -> (427, 16.4043)
  arc A90 (433, 16.4043) -> (427, 16.4043) centre (430, 16.4043) ccw
  line L300 (433, 16.4043) -> (433, -11.5957)
  arc A91 (427, -11.5957) -> (433, -11.5957) centre (430, -11.5957) ccw
  line L301 (441, 18.4043) -> (441, 28.4043)
  line L302 (441, 28.4043) -> (444, 28.4043)
  line L303 (444, 28.4043) -> (444, 18.4043)
  line L304 (444, 18.4043) -> (441, 18.4043)
  line L305 (441, -8.5957) -> (441, 1.4043)
  line L306 (441, 1.4043) -> (444, 1.4043)
  line L307 (444, 1.4043) -> (444, -8.5957)
  line L308 (444, -8.5957) -> (441, -8.5957)
  line L309 (379, 1.4043) -> (376, 1.4043)
  line L310 (376, 1.4043) -> (376, -8.5957)
  line L311 (376, -8.5957) -> (379, -8.5957)
  line L312 (379, -8.5957) -> (379, 1.4043)
  line L313 (379, 28.4043) -> (376, 28.4043)
  line L314 (376, 28.4043) -> (376, 18.4043)
  line L315 (376, 18.4043) -> (379, 18.4043)
  line L316 (379, 18.4043) -> (379, 28.4043)
  circle A92 centre (410, 24.4043) radius 3
  circle A93 centre (371.5, 10.4043) radius 3
  circle A94 centre (448.5, 10.4043) radius 3
  circle A95 centre (410, 8.4043) radius 3
  circle A96 centre (372.2748, -18.2989) radius 3
  circle A97 centre (447.7252, -18.2989) radius 3
  line L317 (348, 71) -> (472.0002, 71)
  line L318 (472.0002, 71) -> (472.0002, 68.4043)
  line L319 (472.0002, 68.4043) -> (465, 68.4043)
  line L320 (465, 68.4043) -> (465, 65.4043)
  line L321 (465, 65.4043) -> (472.0002, 65.4043)
  line L322 (472.0002, 65.4043) -> (472.0002, 51.4043)
  line L323 (472.0002, 51.4043) -> (465, 51.4043)
  line L324 (465, 51.4043) -> (465, 48.4043)
  line L325 (465, 48.4043) -> (472.0002, 48.4043)
  line L326 (472.0002, 48.4043) -> (472.0002, 45)
  line L327 (472.0002, 45) -> (348, 45)
  line L328 (348, 45) -> (348, 48.4043)
  line L329 (348, 48.4043) -> (355, 48.4043)
  line L330 (355, 48.4043) -> (355, 51.4043)
  line L331 (355, 51.4043) -> (348, 51.4043)
  line L332 (348, 51.4043) -> (348, 65.4043)
  line L333 (348, 65.4043) -> (355, 65.4043)
  line L334 (355, 65.4043) -> (355, 68.4043)
  line L335 (355, 68.4043) -> (348, 68.4043)
  line L336 (348, 68.4043) -> (348, 71)
  line L337 (379.0002, 61.9043) -> (376.0002, 61.9043)
  line L338 (376.0002, 61.9043) -> (376.0002, 54.9043)
  line L339 (376.0002, 54.9043) -> (379.0002, 54.9043)
  line L340 (379.0002, 54.9043) -> (379.0002, 61.9043)
  line L341 (379.0002, 65.4043) -> (370, 65.4043)
  line L342 (370, 65.4043) -> (370, 68.4043)
  line L343 (370, 68.4043) -> (402.5, 68.4043)
  line L344 (402.5, 68.4043) -> (402.5, 65.4043)
  line L345 (402.5, 65.4043) -> (379.0002, 65.4043)
  line L346 (376.0002, 51.4043) -> (402.5, 51.4043)
  line L347 (402.5, 51.4043) -> (402.5, 48.4043)
  line L348 (402.5, 48.4043) -> (370, 48.4043)
  line L349 (370, 48.4043) -> (370, 51.4043)
  line L350 (370, 51.4043) -> (376.0002, 51.4043)
  line L351 (417.5, 65.4043) -> (417.5, 68.4043)
  line L352 (417.5, 68.4043) -> (450, 68.4043)
  line L353 (450, 68.4043) -> (450, 65.4043)
  line L354 (450, 65.4043) -> (417.5, 65.4043)
  line L355 (441, 61.9043) -> (444, 61.9043)
  line L356 (444, 61.9043) -> (444, 54.9043)
  line L357 (444, 54.9043) -> (441, 54.9043)
  line L358 (441, 54.9043) -> (441, 61.9043)
  line L359 (444, 51.4043) -> (417.5, 51.4043)
  line L360 (417.5, 51.4043) -> (417.5, 48.4043)
  line L361 (417.5, 48.4043) -> (450, 48.4043)
  line L362 (450, 48.4043) -> (450, 51.4043)
  line L363 (450, 51.4043) -> (444, 51.4043)
  line L364 (672, -101.5) -> (672, -103)
  line L365 (672, -103) -> (695, -103)
  line L366 (695, -103) -> (695, -107.1363)
  arc A98 (692.2891, -110.9229) -> (695, -107.1363) centre (691, -107.1363) ccw
  line L367 (692.2891, -110.9229) -> (650.6445, -125.0997)
  arc A99 (648, -123.2064) -> (650.6445, -125.0997) centre (650, -123.2064) ccw
  line L368 (648, -123.2064) -> (648, -115)
  line L369 (648, -115) -> (649, -115)
  arc A100 (649, -115) -> (651, -113) centre (649, -113) ccw
  line L370 (651, -113) -> (651, -90)
  arc A101 (651, -90) -> (649, -88) centre (649, -90) ccw
  line L371 (649, -88) -> (648, -88)
  line L372 (648, -88) -> (648, -79.7936)
  arc A102 (650.6445, -77.9003) -> (648, -79.7936) centre (650, -79.7936) ccw
  line L373 (650.6445, -77.9003) -> (692.2891, -92.0771)
  arc A103 (695, -95.8637) -> (692.2891, -92.0771) centre (691, -95.8637) ccw
  line L374 (695, -95.8637) -> (695, -100)
  line L375 (695, -100) -> (672, -100)
  line L376 (672, -100) -> (672, -101.5)
  line L377 (671, 47.5) -> (671, 46)
  line L378 (671, 46) -> (694, 46)
  line L379 (694, 46) -> (694, 41.8637)
  arc A104 (691.2891, 38.0771) -> (694, 41.8637) centre (690, 41.8637) ccw
  line L380 (691.2891, 38.0771) -> (649.6445, 23.9003)
  arc A105 (647, 25.7936) -> (649.6445, 23.9003) centre (649, 25.7936) ccw
  line L381 (647, 25.7936) -> (647, 34)
  line L382 (647, 34) -> (648, 34)
  arc A106 (648, 34) -> (650, 36) centre (648, 36) ccw
  line L383 (650, 36) -> (650, 59)
  arc A107 (650, 59) -> (648, 61) centre (648, 59) ccw
  line L384 (648, 61) -> (647, 61)
  line L385 (647, 61) -> (647, 69.2064)
  arc A108 (649.6445, 71.0997) -> (647, 69.2064) centre (649, 69.2064) ccw
  line L386 (649.6445, 71.0997) -> (691.2891, 56.9229)
  arc A109 (694, 53.1363) -> (691.2891, 56.9229) centre (690, 53.1363) ccw
  line L387 (694, 53.1363) -> (694, 49)
  line L388 (694, 49) -> (671, 49)
  line L389 (671, 49) -> (671, 47.5)
  line L390 (692.5332, 13) -> (713, 13)
  line L391 (713, 13) -> (713, 28)
  line L392 (713, 28) -> (716, 28)
  line L393 (716, 28) -> (716, 37.1982)
  arc A110 (716, 37.1982) -> (710.5775, 40.9368) centre (712, 37.1982) ccw
  line L394 (710.5775, 40.9368) -> (655.7406, 20.0715)
  arc A111 (655.7406, 20.0715) -> (649.7575, 13.7252) centre (659.2969, 10.7252) ccw
  line L395 (649.7575, 13.7252) -> (659.2969, 13.7252)
  arc A112 (659.2969, 7.7252) -> (659.2969, 13.7252) centre (659.2969, 10.7252) ccw
  line L396 (659.2969, 7.7252) -> (649.2969, 7.7252)
  line L397 (649.2969, 7.7252) -> (649.2963, 1.7997)
  arc A113 (677.6446, -24) -> (649.2963, 1.7997) centre (649, -27) ccw
  line L398 (677.6446, -24) -> (686, -24)
  arc A114 (686.0452, -29.9997) -> (686, -24) centre (686, -27) ccw
  line L399 (686.0452, -29.9997) -> (677.6446, -29.9997)
  arc A115 (649.2975, -55.7997) -> (677.6446, -29.9997) centre (649, -27) ccw
  line L400 (649.2975, -55.7997) -> (649.2976, -61.7252)
  line L401 (649.2976, -61.7252) -> (659.2969, -61.7252)
  arc A116 (659.2969, -67.7252) -> (659.2969, -61.7252) centre (659.2969, -64.7252) ccw
  line L402 (659.2969, -67.7252) -> (649.7575, -67.7252)
  arc A117 (649.7575, -67.7252) -> (655.7406, -74.0715) centre (659.2969, -64.7252) ccw
  line L403 (655.7406, -74.0715) -> (710.5775, -94.9368)
  arc A118 (710.5775, -94.9368) -> (716, -91.1982) centre (712, -91.1982) ccw
  line L404 (716, -91.1982) -> (716, -82)
  line L405 (716, -82) -> (713, -82)
  line L406 (713, -82) -> (713, -67)
  line L407 (713, -67) -> (692.5332, -67)
  line L408 (692.5332, -67) -> (692.5332, -64)
  line L409 (692.5332, -64) -> (716, -64)
  line L410 (716, -64) -> (716, -34.5)
  line L411 (716, -34.5) -> (713, -34.5)
  line L412 (713, -34.5) -> (713, -19.5)
  line L413 (713, -19.5) -> (716, -19.5)
  line L414 (716, -19.5) -> (716, 10)
  line L415 (716, 10) -> (692.5332, 10)
  line L416 (692.5332, 10) -> (692.5332, 13)
  point P0 (0, 0)
  point P1 (461.0632, -21.5795)
  point P2 (593.1982, -27.002)
  point P3 (576.0715, 33.2574)
  point P4 (548.1018, 34.0716)
  point P5 (509.8984, 34.0712)
  point P6 (481.9285, 33.2574)
  point P7 (506, -5.002)
  point P8 (506, 22.998)
  point P9 (512, -5.002)
  point P10 (552, -5.002)
extrude "Extrusion2" add sketch "Sketch2" along normal blind 3 contours L263 A74 A75 A76 L264 A77 L265 A78 L266 L267 L268 L269 L270 L271 L272 L273 L274 L275 L276 L277 L278 A79 L279 A80
properties part number "soporte_lateral"
